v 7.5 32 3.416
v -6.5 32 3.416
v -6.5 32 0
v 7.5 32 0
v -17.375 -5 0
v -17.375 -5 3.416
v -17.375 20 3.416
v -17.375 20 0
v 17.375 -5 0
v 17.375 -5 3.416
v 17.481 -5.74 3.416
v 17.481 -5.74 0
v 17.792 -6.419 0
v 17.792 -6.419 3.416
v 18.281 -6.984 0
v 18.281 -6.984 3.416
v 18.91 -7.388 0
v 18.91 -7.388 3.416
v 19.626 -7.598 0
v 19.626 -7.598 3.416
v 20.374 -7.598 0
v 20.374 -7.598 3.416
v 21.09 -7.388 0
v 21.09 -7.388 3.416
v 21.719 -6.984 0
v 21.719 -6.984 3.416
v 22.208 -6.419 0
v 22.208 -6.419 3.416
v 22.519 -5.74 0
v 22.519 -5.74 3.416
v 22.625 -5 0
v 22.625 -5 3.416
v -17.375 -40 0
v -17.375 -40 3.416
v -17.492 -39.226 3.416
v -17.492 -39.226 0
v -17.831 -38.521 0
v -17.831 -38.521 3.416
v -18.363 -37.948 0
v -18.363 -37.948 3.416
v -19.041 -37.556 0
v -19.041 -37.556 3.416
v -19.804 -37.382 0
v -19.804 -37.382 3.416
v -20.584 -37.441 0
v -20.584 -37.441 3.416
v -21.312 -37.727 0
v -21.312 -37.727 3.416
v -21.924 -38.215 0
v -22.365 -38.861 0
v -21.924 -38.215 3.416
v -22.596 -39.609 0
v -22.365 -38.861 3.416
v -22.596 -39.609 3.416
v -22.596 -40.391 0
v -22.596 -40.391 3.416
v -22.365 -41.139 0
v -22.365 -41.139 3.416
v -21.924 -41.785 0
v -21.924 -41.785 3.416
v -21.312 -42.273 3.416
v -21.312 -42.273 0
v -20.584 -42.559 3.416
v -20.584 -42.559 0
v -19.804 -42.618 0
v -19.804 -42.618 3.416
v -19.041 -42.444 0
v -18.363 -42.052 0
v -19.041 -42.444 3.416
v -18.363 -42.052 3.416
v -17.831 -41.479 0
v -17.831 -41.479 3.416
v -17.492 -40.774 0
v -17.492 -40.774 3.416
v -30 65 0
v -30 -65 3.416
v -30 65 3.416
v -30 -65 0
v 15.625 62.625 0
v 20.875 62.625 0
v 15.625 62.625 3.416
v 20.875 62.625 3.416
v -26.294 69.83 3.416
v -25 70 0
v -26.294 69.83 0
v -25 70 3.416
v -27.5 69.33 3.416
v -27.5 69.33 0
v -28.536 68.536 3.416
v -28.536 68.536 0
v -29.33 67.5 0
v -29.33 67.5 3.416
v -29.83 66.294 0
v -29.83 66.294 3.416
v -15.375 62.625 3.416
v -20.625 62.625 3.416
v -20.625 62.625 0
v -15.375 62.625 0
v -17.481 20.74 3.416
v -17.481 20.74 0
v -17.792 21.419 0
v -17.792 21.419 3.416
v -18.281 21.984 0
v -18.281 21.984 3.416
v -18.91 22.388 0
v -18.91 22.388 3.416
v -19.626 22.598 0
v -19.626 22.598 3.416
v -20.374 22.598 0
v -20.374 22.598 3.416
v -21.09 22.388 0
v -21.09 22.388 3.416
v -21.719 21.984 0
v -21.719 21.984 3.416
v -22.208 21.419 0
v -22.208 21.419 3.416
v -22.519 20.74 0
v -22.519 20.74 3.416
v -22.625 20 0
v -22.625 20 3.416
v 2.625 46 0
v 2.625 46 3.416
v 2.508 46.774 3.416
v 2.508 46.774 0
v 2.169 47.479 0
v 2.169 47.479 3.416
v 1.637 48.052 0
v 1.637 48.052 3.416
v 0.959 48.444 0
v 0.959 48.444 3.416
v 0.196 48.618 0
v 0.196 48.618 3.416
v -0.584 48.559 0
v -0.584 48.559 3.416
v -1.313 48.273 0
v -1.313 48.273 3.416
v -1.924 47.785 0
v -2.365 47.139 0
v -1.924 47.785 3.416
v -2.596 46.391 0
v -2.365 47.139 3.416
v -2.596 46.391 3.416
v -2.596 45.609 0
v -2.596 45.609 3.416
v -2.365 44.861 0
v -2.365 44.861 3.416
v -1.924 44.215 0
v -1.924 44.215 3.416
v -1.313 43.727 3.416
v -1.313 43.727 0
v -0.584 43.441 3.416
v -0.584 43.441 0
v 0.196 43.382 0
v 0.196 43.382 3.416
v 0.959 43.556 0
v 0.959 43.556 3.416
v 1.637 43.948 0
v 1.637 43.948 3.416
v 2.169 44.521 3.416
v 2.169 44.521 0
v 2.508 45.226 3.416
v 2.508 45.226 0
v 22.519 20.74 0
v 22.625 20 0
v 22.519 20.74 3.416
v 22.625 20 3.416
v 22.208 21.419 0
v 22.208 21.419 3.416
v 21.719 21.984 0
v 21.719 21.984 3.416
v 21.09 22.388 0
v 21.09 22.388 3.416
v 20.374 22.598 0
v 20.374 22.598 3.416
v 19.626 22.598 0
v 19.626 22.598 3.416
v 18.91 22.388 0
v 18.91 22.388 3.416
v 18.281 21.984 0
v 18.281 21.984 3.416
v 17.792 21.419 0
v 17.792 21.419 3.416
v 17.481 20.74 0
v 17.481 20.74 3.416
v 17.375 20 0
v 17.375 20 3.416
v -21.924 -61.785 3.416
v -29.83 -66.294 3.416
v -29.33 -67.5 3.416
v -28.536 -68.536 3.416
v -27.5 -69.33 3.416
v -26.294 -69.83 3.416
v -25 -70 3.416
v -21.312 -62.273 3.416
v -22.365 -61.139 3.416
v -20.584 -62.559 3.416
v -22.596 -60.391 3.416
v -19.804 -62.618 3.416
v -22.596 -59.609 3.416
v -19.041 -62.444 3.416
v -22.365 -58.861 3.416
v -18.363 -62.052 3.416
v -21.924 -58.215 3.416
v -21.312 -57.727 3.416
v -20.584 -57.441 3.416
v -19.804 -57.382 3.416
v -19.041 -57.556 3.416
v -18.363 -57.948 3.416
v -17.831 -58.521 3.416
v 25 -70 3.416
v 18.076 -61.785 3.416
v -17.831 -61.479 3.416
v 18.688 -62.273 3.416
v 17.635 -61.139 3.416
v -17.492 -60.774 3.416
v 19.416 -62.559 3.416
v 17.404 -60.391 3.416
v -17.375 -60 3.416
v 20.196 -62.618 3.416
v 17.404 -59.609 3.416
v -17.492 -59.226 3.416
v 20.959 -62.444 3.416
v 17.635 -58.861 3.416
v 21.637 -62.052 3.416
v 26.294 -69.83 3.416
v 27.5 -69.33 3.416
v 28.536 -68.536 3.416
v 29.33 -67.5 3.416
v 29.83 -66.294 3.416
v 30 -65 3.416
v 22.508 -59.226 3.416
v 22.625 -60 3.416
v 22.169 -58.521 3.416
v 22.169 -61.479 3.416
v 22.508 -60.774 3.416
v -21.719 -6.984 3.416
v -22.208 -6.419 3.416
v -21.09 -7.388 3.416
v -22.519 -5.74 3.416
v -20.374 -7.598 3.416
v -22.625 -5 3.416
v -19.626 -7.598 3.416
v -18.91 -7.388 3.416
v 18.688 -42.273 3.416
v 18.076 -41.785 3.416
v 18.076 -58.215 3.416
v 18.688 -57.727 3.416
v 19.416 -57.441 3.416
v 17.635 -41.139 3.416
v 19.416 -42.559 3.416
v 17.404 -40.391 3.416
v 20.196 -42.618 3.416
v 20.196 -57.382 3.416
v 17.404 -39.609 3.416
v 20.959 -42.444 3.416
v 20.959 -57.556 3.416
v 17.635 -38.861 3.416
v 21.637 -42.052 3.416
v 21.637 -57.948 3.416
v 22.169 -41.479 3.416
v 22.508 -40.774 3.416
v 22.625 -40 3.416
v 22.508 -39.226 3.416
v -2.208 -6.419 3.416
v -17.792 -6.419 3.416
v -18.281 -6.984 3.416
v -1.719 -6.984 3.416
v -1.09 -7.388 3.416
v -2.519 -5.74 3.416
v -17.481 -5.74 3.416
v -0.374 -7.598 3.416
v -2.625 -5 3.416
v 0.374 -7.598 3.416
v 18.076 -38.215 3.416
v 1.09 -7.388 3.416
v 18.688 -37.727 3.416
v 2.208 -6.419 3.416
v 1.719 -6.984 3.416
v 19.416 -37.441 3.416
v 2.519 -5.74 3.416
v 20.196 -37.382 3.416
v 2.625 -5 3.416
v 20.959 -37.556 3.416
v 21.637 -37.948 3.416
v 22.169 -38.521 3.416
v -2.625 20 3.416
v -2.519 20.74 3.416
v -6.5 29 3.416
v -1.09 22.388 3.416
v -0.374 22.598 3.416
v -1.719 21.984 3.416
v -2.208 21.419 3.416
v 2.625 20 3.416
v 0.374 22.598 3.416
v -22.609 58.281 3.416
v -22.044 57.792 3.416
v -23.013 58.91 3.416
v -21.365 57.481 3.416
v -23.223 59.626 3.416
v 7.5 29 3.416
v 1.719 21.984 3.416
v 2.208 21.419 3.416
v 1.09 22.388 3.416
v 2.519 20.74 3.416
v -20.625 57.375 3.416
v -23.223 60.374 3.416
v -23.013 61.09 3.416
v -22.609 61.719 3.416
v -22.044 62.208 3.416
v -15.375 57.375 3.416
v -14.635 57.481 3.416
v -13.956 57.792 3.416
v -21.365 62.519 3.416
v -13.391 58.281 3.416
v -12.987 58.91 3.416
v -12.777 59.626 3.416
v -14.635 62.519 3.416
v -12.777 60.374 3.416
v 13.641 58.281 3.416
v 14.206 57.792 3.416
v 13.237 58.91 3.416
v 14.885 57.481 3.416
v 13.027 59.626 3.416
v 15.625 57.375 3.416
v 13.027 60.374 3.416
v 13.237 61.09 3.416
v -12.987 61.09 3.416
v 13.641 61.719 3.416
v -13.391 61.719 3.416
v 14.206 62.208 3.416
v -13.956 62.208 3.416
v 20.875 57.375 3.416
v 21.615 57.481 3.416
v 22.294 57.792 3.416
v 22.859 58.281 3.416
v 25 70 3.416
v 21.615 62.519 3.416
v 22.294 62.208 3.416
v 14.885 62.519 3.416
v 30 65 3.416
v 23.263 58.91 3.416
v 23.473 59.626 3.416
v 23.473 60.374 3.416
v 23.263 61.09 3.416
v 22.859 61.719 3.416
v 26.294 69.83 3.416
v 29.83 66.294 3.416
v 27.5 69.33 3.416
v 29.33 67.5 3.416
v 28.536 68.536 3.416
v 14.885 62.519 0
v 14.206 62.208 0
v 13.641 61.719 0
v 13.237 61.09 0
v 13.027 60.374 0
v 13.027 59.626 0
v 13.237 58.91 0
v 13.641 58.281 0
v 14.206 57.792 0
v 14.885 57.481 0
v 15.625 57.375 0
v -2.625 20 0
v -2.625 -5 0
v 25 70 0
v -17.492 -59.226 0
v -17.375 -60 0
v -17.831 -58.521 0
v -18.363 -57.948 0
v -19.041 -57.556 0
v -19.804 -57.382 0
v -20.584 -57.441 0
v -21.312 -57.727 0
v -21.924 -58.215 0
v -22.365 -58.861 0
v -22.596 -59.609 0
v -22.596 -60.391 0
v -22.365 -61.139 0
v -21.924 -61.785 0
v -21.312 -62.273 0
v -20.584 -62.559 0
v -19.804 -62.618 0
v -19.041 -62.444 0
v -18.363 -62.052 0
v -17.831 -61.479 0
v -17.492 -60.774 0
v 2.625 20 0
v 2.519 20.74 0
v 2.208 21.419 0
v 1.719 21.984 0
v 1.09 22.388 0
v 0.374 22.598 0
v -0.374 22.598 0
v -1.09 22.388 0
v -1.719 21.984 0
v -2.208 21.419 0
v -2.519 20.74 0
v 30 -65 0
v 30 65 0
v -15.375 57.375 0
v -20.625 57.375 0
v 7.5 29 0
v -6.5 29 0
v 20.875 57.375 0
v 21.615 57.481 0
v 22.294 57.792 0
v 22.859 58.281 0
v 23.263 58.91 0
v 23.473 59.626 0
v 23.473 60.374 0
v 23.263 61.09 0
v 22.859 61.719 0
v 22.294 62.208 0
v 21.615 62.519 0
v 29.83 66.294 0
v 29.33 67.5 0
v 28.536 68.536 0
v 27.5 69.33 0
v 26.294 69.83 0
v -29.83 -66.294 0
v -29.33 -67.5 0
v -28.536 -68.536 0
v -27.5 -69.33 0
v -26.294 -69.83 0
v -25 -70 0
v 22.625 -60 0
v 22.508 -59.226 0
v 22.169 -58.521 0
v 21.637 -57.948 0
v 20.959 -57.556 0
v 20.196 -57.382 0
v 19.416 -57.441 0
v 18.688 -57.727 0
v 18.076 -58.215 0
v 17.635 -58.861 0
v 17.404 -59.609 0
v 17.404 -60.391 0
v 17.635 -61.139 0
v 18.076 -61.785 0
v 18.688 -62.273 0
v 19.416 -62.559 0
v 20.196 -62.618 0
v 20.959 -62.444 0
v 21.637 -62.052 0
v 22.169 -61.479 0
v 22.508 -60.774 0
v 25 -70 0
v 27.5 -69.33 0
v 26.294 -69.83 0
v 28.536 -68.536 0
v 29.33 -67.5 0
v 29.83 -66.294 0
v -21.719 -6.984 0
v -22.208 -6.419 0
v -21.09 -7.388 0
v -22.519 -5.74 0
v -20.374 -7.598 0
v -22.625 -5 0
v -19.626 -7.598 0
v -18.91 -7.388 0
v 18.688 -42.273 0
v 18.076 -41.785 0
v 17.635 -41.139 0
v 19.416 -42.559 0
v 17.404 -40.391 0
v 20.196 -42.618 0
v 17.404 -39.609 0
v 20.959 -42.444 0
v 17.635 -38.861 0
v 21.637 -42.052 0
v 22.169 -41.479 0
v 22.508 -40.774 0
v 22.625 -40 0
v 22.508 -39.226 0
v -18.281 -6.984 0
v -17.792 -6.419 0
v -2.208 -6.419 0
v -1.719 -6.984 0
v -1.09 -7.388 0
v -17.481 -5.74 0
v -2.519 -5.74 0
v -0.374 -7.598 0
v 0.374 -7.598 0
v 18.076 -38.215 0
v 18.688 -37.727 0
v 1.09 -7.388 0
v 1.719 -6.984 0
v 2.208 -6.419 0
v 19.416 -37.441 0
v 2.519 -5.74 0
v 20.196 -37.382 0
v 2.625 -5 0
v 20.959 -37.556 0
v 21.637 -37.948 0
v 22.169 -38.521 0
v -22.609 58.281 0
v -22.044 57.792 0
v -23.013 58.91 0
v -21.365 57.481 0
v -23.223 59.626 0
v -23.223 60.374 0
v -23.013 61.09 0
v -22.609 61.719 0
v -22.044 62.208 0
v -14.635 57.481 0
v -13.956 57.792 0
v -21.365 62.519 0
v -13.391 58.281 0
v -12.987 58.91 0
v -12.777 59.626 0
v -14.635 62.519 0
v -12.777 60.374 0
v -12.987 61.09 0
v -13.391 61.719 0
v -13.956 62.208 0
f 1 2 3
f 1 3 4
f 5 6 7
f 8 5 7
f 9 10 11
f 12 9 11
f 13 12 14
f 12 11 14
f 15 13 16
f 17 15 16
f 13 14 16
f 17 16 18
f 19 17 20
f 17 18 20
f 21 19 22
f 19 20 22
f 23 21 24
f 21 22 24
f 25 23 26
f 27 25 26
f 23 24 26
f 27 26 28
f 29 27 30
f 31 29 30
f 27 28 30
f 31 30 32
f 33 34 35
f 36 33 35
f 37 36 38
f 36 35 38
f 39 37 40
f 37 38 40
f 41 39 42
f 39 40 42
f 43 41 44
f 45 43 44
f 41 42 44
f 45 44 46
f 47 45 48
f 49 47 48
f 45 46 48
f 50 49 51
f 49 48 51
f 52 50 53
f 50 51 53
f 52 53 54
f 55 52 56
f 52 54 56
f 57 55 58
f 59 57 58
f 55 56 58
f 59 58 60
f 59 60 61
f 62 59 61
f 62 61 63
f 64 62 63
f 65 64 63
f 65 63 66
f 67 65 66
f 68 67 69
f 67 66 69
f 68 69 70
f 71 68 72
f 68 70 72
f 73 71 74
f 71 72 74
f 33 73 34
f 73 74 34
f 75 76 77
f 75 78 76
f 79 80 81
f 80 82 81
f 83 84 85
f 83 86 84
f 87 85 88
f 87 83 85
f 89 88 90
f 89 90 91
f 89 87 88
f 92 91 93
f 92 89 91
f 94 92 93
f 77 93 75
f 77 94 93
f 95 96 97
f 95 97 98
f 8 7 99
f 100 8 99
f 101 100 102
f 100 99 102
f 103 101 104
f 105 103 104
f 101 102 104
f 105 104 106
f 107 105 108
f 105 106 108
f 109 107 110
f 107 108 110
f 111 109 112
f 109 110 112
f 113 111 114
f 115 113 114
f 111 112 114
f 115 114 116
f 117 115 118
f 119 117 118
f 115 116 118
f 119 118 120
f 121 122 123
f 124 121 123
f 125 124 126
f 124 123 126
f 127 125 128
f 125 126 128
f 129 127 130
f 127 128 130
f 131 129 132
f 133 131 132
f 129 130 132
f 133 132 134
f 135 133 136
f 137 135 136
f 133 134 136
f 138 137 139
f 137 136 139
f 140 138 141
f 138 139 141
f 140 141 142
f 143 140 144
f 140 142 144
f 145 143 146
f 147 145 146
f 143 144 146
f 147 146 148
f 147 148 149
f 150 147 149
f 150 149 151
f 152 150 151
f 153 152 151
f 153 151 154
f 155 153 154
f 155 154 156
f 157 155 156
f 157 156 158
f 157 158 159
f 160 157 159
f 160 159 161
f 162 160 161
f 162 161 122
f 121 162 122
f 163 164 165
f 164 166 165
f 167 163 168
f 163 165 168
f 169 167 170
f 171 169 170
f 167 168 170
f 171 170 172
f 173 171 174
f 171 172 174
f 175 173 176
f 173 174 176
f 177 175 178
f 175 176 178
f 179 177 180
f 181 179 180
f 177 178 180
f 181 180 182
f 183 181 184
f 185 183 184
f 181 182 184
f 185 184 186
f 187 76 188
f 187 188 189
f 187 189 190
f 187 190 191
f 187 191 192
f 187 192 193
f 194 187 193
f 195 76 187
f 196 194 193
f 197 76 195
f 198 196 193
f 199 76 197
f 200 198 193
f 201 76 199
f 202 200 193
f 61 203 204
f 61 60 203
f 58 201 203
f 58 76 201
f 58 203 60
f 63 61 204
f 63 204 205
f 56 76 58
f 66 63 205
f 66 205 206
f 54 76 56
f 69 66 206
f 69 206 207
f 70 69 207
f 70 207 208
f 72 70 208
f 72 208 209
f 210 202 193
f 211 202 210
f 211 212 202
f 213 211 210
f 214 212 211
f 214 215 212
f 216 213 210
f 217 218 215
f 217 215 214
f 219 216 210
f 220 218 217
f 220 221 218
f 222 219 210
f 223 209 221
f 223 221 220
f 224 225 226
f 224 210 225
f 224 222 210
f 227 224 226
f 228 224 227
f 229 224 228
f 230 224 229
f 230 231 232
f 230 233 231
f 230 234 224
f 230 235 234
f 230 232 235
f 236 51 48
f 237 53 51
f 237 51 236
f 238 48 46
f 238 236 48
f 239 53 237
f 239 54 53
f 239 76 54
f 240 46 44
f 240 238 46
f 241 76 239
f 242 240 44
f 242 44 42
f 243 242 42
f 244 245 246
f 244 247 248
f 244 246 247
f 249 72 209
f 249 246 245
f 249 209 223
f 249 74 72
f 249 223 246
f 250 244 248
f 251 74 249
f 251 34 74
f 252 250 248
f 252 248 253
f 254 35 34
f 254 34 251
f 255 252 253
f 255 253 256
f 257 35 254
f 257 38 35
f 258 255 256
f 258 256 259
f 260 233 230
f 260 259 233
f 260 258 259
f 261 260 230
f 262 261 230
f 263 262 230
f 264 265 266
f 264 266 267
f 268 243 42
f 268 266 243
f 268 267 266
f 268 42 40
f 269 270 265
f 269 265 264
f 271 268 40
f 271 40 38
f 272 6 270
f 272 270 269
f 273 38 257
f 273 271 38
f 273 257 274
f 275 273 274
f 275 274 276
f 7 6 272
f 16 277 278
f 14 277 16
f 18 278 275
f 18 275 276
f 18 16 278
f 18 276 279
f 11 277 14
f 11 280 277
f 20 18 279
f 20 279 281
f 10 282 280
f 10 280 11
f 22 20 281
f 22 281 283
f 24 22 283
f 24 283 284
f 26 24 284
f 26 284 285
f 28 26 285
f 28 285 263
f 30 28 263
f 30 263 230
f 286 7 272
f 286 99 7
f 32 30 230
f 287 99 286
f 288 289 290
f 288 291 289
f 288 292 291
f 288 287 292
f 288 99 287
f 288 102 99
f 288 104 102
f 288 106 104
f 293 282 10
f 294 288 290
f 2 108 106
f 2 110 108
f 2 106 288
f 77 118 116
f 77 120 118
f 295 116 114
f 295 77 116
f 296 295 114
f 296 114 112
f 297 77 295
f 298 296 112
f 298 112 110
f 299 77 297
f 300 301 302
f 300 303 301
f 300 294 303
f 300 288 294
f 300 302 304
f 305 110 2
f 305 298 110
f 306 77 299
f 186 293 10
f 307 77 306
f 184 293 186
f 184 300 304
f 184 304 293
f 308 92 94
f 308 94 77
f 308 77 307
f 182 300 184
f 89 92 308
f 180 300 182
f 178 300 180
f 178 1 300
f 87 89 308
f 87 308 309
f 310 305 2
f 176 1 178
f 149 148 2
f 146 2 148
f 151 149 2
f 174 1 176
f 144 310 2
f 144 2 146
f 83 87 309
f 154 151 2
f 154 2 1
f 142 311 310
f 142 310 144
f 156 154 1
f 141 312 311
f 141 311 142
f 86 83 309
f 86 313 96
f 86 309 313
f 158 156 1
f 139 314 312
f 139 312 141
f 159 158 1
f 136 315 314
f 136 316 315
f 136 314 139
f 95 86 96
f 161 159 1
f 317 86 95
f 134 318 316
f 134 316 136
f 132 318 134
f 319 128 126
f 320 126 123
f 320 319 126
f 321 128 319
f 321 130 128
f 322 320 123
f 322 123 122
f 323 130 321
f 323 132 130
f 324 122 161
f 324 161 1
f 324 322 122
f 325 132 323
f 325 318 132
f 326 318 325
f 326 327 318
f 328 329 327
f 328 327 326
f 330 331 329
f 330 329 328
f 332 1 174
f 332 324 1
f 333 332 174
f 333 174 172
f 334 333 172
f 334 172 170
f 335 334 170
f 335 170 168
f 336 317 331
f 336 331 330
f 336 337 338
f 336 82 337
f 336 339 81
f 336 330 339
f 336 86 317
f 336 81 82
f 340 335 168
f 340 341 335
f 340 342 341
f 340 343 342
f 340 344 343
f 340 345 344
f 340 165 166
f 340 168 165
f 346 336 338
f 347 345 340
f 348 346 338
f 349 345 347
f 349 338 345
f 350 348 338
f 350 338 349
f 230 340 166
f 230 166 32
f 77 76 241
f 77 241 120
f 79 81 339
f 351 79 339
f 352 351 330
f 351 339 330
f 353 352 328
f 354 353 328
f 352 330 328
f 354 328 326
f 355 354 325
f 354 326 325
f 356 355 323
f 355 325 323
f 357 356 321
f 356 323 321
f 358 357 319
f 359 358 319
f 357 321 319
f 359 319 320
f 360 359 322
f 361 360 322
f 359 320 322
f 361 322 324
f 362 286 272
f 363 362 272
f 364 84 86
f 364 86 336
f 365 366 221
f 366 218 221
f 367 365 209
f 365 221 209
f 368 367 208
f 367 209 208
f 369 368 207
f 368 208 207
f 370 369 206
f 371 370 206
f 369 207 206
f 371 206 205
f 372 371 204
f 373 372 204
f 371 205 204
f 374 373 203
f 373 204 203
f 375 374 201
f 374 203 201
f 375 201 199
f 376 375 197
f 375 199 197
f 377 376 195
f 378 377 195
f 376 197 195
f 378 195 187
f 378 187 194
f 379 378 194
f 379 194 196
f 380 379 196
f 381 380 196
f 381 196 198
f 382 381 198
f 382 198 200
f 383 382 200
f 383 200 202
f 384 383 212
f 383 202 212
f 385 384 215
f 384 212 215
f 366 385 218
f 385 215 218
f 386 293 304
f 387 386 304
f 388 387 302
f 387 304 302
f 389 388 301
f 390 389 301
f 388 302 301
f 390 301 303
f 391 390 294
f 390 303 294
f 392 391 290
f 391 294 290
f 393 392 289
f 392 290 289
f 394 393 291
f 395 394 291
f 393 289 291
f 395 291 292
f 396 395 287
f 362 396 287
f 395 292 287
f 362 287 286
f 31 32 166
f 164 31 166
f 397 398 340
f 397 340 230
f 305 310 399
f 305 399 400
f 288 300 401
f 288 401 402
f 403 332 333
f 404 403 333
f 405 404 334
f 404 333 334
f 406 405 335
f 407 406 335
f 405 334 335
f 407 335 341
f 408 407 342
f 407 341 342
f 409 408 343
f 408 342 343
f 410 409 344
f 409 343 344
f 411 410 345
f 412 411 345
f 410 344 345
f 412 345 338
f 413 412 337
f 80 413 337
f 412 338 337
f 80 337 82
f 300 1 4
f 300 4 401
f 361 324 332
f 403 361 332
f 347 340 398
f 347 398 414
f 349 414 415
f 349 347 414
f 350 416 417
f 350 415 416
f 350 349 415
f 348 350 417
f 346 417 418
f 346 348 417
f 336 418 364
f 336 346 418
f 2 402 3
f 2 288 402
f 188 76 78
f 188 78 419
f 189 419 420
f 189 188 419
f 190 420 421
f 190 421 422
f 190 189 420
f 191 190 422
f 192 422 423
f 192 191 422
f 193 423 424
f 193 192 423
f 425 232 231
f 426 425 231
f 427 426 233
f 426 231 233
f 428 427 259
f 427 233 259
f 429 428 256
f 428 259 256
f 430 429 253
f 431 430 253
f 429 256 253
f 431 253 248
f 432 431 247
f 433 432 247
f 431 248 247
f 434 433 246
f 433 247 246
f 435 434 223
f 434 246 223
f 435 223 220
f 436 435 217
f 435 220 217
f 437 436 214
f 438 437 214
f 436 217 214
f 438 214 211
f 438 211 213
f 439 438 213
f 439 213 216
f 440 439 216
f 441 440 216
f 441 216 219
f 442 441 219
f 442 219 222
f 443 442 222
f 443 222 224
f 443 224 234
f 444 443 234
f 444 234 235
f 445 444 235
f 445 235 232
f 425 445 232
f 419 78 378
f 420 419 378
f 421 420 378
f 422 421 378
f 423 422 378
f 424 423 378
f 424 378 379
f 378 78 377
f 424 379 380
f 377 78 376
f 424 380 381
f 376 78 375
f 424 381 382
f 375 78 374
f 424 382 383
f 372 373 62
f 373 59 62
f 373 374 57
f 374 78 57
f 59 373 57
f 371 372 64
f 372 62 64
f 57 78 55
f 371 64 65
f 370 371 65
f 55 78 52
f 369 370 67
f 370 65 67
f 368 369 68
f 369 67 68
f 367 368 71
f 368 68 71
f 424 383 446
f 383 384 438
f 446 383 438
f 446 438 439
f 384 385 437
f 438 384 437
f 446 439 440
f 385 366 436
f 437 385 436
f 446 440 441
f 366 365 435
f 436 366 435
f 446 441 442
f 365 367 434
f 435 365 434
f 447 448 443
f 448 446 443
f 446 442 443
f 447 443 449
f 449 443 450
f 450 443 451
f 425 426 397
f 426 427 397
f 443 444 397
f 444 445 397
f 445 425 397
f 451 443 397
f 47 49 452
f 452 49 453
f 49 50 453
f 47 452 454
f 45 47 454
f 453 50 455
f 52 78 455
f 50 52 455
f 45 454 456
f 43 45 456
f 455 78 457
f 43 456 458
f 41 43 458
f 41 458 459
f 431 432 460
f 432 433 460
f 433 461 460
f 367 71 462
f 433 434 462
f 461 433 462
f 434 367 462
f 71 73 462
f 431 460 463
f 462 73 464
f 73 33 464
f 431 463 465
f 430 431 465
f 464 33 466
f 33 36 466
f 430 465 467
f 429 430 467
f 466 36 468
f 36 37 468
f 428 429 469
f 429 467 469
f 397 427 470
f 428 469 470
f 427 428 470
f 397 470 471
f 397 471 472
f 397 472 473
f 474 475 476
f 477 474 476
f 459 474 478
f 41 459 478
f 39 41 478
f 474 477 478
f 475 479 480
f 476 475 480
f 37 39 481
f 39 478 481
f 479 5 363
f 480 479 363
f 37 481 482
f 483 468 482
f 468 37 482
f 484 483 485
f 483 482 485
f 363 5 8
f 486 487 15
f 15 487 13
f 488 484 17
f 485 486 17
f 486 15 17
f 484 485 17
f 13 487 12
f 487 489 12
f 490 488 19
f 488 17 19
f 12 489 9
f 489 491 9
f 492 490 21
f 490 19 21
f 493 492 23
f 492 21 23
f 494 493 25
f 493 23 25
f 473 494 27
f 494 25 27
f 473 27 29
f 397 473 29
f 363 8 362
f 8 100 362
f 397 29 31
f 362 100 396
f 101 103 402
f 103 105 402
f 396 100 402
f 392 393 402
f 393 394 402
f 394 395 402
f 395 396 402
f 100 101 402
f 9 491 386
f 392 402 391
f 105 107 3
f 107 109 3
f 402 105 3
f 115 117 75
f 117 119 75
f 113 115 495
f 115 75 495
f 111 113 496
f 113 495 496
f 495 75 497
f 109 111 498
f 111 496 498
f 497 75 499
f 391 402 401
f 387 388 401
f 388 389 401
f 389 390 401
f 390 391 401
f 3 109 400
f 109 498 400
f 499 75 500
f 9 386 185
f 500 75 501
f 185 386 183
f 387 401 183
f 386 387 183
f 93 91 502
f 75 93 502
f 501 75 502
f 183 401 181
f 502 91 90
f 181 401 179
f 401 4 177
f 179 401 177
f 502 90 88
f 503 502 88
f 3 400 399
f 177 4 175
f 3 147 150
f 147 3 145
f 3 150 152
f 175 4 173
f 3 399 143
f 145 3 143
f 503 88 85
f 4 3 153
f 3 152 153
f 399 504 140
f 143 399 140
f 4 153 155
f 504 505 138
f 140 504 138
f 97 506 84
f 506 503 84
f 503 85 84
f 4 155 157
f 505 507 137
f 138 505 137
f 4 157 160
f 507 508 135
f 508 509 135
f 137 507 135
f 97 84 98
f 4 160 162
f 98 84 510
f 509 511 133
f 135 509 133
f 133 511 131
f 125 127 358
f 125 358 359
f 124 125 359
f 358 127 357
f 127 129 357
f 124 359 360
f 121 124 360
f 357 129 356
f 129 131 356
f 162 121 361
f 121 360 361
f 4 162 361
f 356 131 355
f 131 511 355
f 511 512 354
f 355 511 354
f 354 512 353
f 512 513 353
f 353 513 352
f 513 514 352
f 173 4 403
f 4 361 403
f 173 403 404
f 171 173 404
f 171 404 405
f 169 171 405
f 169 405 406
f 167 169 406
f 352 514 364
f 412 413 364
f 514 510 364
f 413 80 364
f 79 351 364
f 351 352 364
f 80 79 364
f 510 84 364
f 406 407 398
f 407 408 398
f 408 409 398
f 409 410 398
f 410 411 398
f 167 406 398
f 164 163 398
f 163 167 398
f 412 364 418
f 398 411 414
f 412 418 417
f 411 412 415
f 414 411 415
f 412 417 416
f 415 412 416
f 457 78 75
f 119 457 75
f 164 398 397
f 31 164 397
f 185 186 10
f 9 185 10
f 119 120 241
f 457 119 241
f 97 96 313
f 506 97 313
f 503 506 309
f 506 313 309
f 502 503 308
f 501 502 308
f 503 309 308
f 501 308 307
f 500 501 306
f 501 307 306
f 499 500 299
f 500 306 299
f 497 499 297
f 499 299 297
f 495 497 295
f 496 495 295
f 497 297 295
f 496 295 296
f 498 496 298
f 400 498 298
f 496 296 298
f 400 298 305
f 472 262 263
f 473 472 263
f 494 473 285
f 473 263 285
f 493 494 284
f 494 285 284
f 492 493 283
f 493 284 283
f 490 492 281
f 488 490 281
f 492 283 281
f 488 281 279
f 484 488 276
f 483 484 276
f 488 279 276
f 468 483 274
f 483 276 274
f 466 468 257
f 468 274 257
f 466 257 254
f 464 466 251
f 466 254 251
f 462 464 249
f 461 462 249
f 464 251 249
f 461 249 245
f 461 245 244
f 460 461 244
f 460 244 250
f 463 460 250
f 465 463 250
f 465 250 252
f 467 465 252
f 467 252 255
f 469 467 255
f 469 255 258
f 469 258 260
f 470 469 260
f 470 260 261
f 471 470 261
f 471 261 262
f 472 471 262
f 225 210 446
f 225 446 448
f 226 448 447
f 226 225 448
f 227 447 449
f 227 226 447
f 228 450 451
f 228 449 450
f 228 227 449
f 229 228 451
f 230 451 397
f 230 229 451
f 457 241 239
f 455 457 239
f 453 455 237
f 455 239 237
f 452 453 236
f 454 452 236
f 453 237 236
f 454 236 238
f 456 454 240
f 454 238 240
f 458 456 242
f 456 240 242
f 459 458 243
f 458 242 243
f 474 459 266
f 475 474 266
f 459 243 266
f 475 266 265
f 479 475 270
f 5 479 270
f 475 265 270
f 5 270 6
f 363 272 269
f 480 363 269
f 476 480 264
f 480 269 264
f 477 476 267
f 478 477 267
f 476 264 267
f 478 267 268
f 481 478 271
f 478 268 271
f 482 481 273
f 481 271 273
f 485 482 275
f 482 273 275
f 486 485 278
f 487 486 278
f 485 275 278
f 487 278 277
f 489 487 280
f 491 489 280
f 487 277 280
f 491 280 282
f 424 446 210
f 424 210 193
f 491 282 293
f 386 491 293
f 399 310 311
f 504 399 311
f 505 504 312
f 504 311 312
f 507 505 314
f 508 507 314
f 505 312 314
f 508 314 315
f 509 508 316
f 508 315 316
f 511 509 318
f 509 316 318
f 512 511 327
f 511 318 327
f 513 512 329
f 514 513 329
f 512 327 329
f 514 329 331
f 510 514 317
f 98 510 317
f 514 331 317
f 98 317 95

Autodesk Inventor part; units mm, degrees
ref_plane "YZ Plane" through (0, 0, 0) normal (1, 0, 0) x (0, 1, 0)
ref_plane "XZ Plane" through (0, 0, 0) normal (0, 1, 0) x (-1, 0, 0)
ref_plane "XY Plane" through (0, 0, 0) normal (0, 0, 1) x (1, 0, 0)
sketch "Sketch1" plane through (0, 0, 0) normal (0, 0, 1) x (1, 0, 0)
  line L0 (-30, 70) -> (30, 70)
  line L1 (30, 70) -> (30, -70)
  line L2 (30, -70) -> (-30, -70)
  line L3 (-30, -70) -> (-30, 70)
  point P0 (0, 0)
  dimension "d0" = 60
  dimension "d1" = 140
  dimension "d2" = 30
  dimension "d3" = 70
extrude "Extrusion1" add sketch "Sketch1" along normal blind 3.4163
sketch "Sketch2" plane through (0, 0, 3.4163) normal (0, 0, 1) x (1, 0, 0)
  line L0 (-30, 70) -> (-30, -70) projected
  line L1 (-30, -70) -> (30, -70) projected
  circle A0 centre (-20, -60) radius 2.625
  point P0 (0, 0)
  dimension "d6" = 5.25
  dimension "d7" = 10
  dimension "d8" = 10
extrude "Extrusion2" cut sketch "Sketch2" against normal through all
pattern_linear "Rectangular Pattern1" count 2 spacing 40 along (1, 0, 0) count 2 spacing 20 along (0, 1, 0) of "Extrusion2"
sketch "Sketch3" plane through (0, 0, 3.4163) normal (0, 0, 1) x (1, 0, 0)
  line L0 (-30, 70) -> (-30, -70) projected
  line L1 (-30, -70) -> (30, -70) projected
  arc A0 (-22.625, -5) -> (-17.375, -5) centre (-20, -5) ccw
  arc A1 (-17.375, 20) -> (-22.625, 20) centre (-20, 20) ccw
  line L2 (-22.625, 20) -> (-22.625, -5)
  line L3 (-17.375, -5) -> (-17.375, 20)
  point P0 (0, 0)
  dimension "d17" = 5.25
  dimension "d18" = 65
  dimension "d19" = 10
  dimension "d20" = 5.25
  dimension "d22" = 10
  dimension "d26" = 25
  dimension "d27" = 25
extrude "Extrusion3" cut sketch "Sketch3" against normal through all
sketch "Sketch4" plane through (0, 0, 3.4163) normal (0, 0, 1) x (1, 0, 0)
  line L0 (-30, 70) -> (-30, -70) projected
  line L1 (-30, -70) -> (30, -70) projected
  line L2 (-6.5, 32) -> (7.5, 32)
  line L3 (7.5, 32) -> (7.5, 29)
  line L4 (7.5, 29) -> (-6.5, 29)
  line L5 (-6.5, 29) -> (-6.5, 32)
  point P0 (0, 0)
  dimension "d28" = 14
  dimension "d29" = 3
  dimension "d30" = 99
  dimension "d31" = 23.5
extrude "Extrusion4" cut sketch "Sketch4" against normal through all
sketch "Sketch5" plane through (0, 0, 3.4163) normal (0, 0, 1) x (1, 0, 0)
  line L0 (30, 70) -> (-30, 70) projected
  line L1 (-30, 70) -> (-30, -70) projected
  line L2 (-30, -70) -> (30, -70) projected
  circle A0 centre (0, 46) radius 2.625
  arc A1 (-20.625, 62.625) -> (-20.625, 57.375) centre (-20.625, 60) ccw
  arc A2 (15.625, 62.625) -> (15.625, 57.375) centre (15.625, 60) ccw
  arc A3 (-15.375, 57.375) -> (-15.375, 62.625) centre (-15.375, 60) ccw
  line L3 (-20.625, 62.625) -> (-15.375, 62.625)
  line L4 (-15.375, 57.375) -> (-20.625, 57.375)
  arc A4 (20.875, 57.375) -> (20.875, 62.625) centre (20.875, 60) ccw
  line L5 (20.875, 62.625) -> (15.625, 62.625)
  line L6 (15.625, 57.375) -> (20.875, 57.375)
  point P0 (0, 0)
  dimension "d34" = 5.25
  dimension "d35" = 116
  dimension "d36" = 5.25
  dimension "d37" = 5.25
  dimension "d38" = 10
  dimension "d39" = 10
  dimension "d40" = 36.25
  dimension "d41" = 9.375
  dimension "d48" = 5.25
  dimension "d49" = 5.25
  dimension "d50" = 10
  dimension "d51" = 5.25
  dimension "d52" = 5.25
  dimension "d53" = 5.25
  dimension "d54" = 10
  dimension "d55" = 5.25
extrude "Extrusion5" cut sketch "Sketch5" against normal blind 3.4163
pattern_linear "Rectangular Pattern2" count 3 spacing 20 along (1, 0, 0) of "Extrusion3"
fillet "Fillet1" radius 5 4 edges at (-30, 70, 1.7082) (30, 70, 1.7082) (30, -70, 1.7082) (-30, -70, 1.7082)
equation "\"d2\" = 0.5 * d0"
equation "\"d3\" = 0.5 * d1"
equation "\"d20\" = d17"
equation "\"d39\" = d38"
properties part number "26028-01" material "Steel, Mild"
